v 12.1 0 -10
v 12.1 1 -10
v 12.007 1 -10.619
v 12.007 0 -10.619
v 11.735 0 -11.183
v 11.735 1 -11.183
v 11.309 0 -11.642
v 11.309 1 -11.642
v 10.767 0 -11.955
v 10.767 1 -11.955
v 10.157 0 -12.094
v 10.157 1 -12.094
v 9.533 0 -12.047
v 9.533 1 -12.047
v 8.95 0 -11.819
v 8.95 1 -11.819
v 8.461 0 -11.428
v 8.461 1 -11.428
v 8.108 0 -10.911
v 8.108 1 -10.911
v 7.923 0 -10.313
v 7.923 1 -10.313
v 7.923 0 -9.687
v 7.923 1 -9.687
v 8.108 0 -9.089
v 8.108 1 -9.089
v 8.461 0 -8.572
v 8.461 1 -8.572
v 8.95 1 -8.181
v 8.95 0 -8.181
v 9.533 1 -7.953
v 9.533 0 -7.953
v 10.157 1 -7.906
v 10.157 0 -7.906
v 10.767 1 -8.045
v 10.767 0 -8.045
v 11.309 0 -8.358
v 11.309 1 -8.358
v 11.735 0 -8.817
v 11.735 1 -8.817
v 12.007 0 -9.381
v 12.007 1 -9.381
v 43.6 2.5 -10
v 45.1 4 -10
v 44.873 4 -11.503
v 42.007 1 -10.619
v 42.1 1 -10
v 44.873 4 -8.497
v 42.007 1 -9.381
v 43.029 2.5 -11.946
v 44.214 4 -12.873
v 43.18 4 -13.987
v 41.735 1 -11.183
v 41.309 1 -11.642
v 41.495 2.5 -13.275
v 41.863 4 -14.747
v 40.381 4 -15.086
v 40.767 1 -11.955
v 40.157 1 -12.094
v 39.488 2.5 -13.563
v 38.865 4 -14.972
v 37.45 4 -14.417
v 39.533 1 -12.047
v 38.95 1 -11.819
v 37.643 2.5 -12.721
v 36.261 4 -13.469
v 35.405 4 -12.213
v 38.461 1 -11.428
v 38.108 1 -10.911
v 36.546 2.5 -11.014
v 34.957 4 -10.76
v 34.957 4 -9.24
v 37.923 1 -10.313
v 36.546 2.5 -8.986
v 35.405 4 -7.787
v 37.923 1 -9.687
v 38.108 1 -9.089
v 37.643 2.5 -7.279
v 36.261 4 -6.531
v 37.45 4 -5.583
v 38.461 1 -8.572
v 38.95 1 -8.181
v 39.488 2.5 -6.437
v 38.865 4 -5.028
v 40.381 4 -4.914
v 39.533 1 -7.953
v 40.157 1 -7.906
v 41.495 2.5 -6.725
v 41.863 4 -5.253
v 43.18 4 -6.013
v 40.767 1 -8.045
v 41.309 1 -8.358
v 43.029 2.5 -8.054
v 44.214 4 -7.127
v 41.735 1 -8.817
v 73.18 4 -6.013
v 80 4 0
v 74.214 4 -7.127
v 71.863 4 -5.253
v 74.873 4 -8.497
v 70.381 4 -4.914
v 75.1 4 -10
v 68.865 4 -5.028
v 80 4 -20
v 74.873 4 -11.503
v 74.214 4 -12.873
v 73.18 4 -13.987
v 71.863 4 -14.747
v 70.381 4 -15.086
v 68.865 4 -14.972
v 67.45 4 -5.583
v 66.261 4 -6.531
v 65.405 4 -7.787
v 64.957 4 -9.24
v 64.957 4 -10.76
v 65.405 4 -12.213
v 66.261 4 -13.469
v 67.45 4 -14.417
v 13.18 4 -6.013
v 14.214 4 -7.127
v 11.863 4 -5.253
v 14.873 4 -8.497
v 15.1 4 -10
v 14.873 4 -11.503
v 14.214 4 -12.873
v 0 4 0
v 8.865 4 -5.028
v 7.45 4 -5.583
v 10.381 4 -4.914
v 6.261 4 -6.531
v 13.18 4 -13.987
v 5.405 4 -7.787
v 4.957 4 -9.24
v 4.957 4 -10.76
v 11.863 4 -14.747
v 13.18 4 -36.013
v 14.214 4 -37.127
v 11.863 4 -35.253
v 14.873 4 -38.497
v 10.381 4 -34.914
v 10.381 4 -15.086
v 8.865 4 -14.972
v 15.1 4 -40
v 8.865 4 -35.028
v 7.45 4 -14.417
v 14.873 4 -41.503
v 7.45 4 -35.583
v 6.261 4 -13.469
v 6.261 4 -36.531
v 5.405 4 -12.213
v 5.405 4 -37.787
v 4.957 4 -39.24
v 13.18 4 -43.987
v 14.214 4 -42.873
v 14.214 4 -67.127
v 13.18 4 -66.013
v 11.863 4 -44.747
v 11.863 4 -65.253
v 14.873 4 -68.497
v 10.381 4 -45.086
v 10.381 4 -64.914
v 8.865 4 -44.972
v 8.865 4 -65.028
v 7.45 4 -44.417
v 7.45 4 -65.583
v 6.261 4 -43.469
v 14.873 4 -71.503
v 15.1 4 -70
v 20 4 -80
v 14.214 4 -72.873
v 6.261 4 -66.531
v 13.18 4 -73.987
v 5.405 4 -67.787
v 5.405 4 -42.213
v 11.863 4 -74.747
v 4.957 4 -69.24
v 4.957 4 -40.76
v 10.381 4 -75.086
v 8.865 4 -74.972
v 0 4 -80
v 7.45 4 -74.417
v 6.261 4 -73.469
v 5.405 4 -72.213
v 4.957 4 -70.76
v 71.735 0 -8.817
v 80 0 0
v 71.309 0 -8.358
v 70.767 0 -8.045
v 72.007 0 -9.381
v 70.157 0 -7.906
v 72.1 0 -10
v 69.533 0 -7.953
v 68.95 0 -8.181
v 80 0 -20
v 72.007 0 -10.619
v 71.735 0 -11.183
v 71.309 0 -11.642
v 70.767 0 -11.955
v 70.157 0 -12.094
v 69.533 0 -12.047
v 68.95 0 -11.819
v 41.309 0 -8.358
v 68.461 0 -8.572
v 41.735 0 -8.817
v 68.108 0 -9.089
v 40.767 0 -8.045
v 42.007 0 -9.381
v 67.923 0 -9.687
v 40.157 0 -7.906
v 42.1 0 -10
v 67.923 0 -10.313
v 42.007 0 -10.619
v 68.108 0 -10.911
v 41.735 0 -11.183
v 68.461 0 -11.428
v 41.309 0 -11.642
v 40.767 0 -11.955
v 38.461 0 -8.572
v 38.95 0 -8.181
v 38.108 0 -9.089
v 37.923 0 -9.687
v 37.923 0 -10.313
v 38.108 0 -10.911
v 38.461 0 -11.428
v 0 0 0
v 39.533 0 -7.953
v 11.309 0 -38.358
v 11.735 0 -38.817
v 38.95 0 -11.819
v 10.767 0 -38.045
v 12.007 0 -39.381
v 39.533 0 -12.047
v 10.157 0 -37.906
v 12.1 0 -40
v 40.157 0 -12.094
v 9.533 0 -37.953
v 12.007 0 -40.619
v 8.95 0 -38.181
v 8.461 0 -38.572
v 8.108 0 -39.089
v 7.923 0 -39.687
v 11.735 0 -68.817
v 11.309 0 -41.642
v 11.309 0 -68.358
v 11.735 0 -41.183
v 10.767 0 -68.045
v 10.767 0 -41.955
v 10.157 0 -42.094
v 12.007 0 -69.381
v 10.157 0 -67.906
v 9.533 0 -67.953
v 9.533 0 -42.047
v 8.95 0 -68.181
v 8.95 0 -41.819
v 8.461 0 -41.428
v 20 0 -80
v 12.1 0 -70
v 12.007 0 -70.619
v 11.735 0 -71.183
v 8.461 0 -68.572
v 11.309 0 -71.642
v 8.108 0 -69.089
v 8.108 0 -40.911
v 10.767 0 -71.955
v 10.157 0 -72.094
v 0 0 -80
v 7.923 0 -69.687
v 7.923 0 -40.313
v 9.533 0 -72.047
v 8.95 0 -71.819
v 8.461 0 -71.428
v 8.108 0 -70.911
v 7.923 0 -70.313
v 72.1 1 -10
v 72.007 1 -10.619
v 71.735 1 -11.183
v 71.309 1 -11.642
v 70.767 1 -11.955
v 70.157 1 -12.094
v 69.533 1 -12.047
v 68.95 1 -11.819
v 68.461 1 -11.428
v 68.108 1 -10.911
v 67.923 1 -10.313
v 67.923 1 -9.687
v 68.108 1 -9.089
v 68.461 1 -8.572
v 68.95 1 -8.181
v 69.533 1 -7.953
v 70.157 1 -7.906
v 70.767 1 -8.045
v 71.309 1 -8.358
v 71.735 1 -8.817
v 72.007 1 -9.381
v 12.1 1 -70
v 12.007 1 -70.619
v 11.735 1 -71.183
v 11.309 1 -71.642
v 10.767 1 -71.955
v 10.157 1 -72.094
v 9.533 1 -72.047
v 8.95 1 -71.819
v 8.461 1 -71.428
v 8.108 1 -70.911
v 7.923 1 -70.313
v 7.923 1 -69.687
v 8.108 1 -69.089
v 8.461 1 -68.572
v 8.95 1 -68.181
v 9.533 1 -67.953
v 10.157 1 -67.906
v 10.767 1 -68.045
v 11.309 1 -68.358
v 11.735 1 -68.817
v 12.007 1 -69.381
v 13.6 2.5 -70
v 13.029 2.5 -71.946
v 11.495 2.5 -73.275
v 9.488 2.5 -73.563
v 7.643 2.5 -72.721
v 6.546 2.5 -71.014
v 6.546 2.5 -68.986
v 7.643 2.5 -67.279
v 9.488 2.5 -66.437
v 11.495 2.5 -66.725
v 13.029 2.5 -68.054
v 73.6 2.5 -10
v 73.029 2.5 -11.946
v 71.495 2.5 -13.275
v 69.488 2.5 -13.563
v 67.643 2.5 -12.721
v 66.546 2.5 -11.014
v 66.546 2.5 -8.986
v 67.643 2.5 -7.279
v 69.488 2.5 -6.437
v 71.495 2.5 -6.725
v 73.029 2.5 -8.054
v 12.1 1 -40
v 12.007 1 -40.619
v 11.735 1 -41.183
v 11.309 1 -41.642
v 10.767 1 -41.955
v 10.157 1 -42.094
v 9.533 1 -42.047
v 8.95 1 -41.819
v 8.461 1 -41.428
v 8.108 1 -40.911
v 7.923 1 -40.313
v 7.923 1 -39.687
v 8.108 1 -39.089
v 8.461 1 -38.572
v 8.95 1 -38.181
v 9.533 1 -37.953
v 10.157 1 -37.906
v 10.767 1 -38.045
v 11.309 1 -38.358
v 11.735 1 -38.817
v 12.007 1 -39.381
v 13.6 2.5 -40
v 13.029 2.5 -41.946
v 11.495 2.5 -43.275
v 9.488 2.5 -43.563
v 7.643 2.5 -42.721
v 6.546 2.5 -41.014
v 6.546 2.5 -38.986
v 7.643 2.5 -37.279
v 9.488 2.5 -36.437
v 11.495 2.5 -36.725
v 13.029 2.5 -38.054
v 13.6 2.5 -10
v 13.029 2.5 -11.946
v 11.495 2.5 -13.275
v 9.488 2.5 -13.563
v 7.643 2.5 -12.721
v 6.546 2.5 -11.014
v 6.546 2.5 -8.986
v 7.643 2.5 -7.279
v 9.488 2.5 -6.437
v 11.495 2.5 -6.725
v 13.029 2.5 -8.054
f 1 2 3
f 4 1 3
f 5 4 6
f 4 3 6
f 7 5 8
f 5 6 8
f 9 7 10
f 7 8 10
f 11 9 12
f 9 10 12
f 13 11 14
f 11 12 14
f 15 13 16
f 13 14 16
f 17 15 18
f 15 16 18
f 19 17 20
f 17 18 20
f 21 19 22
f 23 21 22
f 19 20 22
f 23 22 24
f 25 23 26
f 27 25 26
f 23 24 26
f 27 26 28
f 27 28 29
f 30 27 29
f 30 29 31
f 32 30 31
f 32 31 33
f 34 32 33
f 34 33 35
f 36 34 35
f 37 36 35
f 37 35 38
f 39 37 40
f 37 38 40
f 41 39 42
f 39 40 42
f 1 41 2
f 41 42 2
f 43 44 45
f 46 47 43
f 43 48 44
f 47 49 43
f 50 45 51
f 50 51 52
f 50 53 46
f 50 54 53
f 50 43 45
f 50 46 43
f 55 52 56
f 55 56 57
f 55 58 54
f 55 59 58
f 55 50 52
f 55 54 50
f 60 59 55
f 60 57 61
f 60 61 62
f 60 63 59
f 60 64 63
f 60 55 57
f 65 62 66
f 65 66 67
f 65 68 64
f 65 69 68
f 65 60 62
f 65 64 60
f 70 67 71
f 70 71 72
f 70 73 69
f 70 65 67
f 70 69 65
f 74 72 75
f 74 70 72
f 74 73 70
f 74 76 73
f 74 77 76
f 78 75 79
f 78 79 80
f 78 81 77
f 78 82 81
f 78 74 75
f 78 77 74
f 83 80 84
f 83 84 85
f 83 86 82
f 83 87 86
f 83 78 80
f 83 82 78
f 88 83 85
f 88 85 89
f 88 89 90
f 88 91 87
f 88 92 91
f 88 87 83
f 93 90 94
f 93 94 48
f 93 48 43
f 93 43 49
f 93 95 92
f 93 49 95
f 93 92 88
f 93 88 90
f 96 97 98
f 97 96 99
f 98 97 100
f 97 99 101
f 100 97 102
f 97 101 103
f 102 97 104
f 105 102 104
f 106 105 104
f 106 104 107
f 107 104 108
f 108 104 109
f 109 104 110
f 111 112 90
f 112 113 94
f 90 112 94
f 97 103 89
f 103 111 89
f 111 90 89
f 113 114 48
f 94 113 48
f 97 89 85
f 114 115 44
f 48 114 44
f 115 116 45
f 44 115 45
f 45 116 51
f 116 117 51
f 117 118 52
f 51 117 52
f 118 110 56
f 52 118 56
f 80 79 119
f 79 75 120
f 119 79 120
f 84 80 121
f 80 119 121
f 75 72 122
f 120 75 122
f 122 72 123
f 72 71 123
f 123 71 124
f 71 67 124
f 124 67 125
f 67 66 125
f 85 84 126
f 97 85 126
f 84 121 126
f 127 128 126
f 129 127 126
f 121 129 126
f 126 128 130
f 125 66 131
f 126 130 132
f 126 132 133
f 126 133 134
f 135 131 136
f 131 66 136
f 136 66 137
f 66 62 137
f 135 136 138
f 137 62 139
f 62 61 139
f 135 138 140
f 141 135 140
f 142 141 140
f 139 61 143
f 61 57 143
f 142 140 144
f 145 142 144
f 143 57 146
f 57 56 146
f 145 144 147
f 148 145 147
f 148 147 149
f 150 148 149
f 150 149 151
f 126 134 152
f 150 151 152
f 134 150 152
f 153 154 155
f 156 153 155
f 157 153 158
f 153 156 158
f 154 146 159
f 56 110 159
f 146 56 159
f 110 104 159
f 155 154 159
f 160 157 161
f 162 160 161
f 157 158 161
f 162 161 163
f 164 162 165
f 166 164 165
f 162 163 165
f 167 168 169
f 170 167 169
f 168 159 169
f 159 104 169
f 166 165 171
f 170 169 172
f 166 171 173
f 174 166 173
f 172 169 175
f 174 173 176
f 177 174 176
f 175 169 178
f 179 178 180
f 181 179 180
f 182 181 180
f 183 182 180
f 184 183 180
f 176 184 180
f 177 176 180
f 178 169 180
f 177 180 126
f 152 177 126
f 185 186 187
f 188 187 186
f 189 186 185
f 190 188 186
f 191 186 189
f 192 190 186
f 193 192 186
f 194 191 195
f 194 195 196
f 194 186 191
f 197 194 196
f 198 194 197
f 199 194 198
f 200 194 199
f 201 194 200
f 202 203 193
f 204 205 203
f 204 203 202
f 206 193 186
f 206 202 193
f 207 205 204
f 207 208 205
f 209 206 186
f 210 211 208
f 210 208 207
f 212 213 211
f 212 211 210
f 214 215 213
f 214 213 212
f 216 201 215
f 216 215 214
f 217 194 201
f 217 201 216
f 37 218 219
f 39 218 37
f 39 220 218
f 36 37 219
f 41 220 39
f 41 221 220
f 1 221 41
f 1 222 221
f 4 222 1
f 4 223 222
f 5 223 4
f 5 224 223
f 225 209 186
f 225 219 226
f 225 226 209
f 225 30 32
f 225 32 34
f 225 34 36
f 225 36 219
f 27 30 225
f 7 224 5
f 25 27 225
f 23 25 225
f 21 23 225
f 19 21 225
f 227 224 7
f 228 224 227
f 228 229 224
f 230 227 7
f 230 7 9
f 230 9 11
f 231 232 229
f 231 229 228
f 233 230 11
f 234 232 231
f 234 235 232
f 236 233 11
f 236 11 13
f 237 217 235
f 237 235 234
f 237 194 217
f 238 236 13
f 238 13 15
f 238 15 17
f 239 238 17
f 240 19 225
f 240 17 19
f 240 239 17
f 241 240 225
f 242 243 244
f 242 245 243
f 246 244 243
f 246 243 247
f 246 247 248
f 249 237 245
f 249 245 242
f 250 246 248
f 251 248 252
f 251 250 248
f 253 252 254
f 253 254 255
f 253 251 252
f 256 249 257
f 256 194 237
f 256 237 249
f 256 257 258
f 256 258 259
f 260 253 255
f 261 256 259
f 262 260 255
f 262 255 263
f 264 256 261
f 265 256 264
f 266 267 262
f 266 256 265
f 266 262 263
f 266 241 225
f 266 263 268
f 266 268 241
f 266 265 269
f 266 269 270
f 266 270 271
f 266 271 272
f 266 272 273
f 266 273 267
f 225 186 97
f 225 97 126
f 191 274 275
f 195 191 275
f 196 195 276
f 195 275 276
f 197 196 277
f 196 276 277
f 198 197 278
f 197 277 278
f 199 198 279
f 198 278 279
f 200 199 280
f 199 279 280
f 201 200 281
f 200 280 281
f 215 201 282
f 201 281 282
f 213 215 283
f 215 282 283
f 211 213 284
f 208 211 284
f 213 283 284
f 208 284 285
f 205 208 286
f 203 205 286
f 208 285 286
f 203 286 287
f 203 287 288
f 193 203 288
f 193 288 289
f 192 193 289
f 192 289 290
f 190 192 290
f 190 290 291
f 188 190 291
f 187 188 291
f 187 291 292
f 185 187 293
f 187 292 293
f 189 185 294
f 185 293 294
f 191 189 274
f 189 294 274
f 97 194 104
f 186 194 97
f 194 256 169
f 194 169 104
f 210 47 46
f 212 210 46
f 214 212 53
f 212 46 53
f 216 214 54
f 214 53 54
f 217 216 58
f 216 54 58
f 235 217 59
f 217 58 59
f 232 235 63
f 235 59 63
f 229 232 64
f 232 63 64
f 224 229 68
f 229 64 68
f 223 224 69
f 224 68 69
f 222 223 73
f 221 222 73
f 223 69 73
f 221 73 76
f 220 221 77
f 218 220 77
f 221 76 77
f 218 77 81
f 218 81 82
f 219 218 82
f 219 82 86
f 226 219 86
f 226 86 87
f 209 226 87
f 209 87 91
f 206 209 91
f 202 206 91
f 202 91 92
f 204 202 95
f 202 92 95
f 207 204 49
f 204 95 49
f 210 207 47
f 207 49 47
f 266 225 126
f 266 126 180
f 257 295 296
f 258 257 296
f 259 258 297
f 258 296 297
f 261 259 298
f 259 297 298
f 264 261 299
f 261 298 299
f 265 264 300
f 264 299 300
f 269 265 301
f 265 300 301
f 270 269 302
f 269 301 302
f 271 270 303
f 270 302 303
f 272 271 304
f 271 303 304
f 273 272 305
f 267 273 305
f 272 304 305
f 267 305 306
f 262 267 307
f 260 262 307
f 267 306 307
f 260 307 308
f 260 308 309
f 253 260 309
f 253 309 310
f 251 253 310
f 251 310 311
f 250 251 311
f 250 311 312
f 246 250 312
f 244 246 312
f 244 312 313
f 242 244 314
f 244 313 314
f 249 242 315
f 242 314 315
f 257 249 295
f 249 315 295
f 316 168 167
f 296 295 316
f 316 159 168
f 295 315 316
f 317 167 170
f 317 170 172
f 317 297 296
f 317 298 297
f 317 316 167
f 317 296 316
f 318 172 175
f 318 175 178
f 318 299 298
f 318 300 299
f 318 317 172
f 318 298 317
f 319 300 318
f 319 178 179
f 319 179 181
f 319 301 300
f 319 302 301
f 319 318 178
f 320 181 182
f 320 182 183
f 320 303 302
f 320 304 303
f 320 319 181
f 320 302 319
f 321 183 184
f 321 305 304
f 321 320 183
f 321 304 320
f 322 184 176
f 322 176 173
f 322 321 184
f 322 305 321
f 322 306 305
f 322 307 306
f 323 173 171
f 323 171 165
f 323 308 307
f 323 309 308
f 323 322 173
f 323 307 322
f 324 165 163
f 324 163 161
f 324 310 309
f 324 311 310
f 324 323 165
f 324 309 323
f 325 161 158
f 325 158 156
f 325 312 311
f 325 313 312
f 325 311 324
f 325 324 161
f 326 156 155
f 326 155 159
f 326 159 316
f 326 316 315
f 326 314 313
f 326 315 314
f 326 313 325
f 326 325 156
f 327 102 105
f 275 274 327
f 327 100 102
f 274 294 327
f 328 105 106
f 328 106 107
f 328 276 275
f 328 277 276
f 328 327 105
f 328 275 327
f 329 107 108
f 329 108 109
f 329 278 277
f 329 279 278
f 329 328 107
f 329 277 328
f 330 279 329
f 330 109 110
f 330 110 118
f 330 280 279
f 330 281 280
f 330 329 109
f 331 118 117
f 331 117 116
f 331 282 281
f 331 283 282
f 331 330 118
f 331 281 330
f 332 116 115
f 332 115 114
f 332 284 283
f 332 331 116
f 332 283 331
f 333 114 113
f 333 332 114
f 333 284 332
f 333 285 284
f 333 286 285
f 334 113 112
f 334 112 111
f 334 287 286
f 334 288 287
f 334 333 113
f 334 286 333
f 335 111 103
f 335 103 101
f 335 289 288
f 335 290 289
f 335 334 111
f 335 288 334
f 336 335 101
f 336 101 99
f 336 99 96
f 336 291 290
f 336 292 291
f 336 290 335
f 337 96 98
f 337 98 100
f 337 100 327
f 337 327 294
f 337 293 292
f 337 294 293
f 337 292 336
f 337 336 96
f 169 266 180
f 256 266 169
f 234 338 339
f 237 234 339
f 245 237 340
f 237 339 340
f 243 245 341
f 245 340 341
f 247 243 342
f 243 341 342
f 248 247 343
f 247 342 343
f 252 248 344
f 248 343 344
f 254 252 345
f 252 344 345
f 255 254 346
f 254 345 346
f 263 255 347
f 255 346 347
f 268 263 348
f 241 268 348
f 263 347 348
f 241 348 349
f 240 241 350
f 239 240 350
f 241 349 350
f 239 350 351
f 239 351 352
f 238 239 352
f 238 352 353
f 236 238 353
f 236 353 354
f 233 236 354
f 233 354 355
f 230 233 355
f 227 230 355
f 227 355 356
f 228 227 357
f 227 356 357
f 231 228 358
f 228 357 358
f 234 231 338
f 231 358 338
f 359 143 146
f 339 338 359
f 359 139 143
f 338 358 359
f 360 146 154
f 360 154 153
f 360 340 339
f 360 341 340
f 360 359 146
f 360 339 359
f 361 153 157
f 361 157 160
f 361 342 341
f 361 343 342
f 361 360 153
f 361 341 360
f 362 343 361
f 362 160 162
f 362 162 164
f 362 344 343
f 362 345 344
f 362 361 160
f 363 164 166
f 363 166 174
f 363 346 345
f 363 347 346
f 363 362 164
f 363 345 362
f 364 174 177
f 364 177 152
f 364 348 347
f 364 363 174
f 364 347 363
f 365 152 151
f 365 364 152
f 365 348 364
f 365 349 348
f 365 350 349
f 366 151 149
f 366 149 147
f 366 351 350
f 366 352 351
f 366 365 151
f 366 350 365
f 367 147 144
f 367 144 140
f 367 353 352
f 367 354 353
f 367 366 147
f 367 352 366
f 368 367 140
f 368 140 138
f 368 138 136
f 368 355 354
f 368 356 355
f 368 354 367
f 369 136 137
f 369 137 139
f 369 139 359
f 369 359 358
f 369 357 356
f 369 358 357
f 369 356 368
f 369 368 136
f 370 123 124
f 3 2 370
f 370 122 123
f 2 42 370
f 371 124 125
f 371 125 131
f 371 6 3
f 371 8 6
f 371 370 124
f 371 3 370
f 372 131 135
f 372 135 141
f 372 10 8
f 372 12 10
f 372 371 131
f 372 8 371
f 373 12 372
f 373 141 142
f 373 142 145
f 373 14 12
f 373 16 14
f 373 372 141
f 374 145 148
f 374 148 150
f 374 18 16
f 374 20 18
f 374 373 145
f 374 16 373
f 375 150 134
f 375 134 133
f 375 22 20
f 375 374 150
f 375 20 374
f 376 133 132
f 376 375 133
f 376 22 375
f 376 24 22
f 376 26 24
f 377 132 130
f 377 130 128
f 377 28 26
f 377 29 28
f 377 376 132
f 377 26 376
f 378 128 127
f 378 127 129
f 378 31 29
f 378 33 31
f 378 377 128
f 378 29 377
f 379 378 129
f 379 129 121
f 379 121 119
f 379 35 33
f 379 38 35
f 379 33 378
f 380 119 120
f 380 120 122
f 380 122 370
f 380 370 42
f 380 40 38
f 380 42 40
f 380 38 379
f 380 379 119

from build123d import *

# Parameters (mm, degrees)
BOSS_EXTRUDE1_DEPTH = 4
SKETCH3_R           = 2.1
CUT_EXTRUDE1_DEPTH  = 4
CHAMFER1_SIZE       = 3


with BuildPart() as part:
    # Sketch1 → Boss-Extrude1 (new body)
    with BuildSketch(Plane(origin=(0, 0, 0), x_dir=(1, 0, 0), z_dir=(0, 1, 0))):
        Polygon((0, 0), (0, 80), (20, 80), (80, 20), (80, 0), align=None)
    extrude(amount=BOSS_EXTRUDE1_DEPTH)

    # Sketch3 → Cut-Extrude1 (cut)
    with BuildSketch(Plane(origin=(0, 4, 0), x_dir=(1, 0, 0), z_dir=(0, 1, 0))):
        with Locations((10, 10)):
            Circle(SKETCH3_R)
        with Locations((40, 10)):
            Circle(SKETCH3_R)
        with Locations((70, 10)):
            Circle(SKETCH3_R)
        with Locations((10, 40)):
            Circle(SKETCH3_R)
        with Locations((10, 70)):
            Circle(SKETCH3_R)
    extrude(amount=-CUT_EXTRUDE1_DEPTH, mode=Mode.SUBTRACT)

    # Chamfer1
    chamfer1_edges = [part.edges().sort_by_distance(p)[0] for p in [
        (7.9, 4, -70),
        (7.9, 4, -40),
        (67.9, 4, -10),
        (7.9, 4, -10),
        (37.9, 4, -10),
    ]]
    chamfer(chamfer1_edges, length=CHAMFER1_SIZE)


solid = part.part
